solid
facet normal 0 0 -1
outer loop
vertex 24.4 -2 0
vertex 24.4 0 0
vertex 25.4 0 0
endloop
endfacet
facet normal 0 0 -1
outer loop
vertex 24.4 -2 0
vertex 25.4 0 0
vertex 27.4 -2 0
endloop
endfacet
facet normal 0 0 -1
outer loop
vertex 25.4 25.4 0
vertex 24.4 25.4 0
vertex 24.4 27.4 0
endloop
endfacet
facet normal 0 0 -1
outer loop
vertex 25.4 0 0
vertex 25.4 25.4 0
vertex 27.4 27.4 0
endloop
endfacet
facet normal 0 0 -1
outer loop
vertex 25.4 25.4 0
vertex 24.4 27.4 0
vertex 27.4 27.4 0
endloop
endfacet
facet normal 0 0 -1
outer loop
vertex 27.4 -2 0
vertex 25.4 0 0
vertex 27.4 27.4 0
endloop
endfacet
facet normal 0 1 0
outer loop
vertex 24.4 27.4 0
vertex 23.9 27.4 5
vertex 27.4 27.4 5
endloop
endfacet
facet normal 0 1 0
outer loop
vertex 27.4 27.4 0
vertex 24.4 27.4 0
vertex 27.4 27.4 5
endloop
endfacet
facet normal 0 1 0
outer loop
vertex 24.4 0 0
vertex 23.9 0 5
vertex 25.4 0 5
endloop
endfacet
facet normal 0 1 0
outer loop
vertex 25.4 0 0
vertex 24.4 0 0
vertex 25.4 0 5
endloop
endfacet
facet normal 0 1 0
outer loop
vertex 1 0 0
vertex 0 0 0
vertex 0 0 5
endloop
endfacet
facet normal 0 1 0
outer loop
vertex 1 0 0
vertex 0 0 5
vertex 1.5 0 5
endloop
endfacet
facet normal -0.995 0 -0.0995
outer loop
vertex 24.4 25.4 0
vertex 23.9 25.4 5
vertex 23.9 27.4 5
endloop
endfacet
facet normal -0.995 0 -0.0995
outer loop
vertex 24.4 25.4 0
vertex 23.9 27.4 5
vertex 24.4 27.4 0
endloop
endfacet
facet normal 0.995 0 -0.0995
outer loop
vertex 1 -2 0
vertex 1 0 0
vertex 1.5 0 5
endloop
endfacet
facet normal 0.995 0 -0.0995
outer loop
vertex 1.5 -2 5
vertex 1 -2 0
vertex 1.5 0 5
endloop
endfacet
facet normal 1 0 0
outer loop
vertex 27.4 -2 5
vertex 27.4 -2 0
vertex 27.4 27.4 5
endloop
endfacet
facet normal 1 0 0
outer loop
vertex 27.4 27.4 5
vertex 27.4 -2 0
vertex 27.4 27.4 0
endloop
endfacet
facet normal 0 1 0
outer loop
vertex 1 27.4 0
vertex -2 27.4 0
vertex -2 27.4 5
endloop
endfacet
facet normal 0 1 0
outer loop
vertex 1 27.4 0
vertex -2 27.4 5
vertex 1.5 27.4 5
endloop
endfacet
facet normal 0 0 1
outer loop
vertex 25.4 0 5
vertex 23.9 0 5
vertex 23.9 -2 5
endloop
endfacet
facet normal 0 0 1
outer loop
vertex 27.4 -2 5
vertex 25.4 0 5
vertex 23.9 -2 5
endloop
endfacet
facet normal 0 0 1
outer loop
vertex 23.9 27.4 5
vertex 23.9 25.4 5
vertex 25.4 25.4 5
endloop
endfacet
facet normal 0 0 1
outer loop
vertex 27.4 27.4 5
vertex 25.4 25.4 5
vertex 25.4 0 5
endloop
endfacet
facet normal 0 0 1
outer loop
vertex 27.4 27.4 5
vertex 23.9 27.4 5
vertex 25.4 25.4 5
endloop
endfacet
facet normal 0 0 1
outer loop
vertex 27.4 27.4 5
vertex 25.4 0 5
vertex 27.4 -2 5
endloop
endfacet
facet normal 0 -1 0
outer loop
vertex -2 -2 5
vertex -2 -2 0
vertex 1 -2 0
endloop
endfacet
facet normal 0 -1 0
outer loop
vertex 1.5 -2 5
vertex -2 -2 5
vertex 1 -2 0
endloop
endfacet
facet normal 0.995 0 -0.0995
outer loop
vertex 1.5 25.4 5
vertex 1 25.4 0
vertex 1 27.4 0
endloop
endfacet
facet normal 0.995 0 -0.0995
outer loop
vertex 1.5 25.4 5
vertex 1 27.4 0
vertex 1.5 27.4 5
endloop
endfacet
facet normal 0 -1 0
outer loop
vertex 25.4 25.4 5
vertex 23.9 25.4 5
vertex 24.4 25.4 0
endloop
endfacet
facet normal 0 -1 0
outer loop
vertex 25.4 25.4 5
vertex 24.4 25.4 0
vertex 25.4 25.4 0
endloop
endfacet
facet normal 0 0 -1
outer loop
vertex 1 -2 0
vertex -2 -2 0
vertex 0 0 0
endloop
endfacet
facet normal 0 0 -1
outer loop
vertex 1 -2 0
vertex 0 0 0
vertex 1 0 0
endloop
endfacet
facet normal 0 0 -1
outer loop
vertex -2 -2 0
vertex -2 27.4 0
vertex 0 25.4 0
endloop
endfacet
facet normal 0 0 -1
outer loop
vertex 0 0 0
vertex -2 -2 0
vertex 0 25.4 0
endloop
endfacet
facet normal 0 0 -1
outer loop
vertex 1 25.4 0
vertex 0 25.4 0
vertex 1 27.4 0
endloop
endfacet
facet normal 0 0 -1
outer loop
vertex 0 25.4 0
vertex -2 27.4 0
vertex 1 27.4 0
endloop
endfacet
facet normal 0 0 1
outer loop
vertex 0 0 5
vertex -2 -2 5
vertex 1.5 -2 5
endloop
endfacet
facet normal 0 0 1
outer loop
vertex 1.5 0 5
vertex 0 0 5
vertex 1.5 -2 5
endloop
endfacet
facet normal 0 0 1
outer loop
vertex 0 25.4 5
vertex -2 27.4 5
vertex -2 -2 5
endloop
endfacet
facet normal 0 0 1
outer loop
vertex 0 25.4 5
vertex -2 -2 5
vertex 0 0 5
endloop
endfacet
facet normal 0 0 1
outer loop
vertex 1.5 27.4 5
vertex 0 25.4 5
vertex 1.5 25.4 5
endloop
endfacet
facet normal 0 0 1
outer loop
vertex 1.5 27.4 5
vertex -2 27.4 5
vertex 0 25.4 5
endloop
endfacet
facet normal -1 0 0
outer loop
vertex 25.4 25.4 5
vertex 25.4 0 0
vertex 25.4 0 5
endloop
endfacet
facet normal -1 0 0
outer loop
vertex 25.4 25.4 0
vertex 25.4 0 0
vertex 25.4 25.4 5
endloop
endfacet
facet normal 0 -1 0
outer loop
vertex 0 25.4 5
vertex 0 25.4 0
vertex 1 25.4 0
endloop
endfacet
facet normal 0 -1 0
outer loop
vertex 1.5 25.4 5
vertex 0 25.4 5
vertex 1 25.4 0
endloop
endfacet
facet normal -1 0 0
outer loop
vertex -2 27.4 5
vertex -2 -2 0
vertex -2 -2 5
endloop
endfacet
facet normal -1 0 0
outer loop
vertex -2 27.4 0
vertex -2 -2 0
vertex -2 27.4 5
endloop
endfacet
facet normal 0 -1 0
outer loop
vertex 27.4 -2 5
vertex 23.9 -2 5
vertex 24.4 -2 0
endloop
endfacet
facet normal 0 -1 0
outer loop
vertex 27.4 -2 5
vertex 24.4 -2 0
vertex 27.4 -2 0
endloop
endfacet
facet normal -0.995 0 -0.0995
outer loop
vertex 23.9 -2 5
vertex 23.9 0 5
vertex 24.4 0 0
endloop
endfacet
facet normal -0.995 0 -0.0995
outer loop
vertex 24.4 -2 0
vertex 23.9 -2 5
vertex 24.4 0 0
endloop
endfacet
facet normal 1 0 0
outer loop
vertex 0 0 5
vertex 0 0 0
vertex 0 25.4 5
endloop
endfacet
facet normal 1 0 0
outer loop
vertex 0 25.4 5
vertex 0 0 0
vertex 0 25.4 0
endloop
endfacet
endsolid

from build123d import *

# Parameters (mm, degrees)
SKETCH_4_W               = 29.4
SKETCH_4_H               = 29.4
SKETCH_4_W_2             = 25.4
SKETCH_4_H_2             = 25.4
EXTRUDE_1_DEPTH          = 5
CUT_EXTRUDE_1_DEPTH      = 28.4
CUT_EXTRUDE_1_DEPTH_BACK = 3


with BuildPart() as part:
    # 草图4 → 拉伸-薄壁1 (new body)
    with BuildSketch(Plane.XY):
        with Locations((12.7, 12.7)):
            Rectangle(SKETCH_4_W, SKETCH_4_H)
        with Locations((12.7, 12.7)):
            Rectangle(SKETCH_4_W_2, SKETCH_4_H_2, mode=Mode.SUBTRACT)
    extrude(amount=EXTRUDE_1_DEPTH)

    # 草图5 → 切除-拉伸1 (cut, two sides)
    with BuildSketch(Plane(origin=(0, 0, 0), x_dir=(1, 0, 0), z_dir=(0, 1, 0))) as cut_extrude_1_sk:
        Polygon((1, 0), (1.5, -5), (23.9, -5), (24.4, 0), align=None)
    extrude(amount=CUT_EXTRUDE_1_DEPTH, mode=Mode.SUBTRACT)
    extrude(cut_extrude_1_sk.sketch, amount=-CUT_EXTRUDE_1_DEPTH_BACK, mode=Mode.SUBTRACT)


solid = part.part
